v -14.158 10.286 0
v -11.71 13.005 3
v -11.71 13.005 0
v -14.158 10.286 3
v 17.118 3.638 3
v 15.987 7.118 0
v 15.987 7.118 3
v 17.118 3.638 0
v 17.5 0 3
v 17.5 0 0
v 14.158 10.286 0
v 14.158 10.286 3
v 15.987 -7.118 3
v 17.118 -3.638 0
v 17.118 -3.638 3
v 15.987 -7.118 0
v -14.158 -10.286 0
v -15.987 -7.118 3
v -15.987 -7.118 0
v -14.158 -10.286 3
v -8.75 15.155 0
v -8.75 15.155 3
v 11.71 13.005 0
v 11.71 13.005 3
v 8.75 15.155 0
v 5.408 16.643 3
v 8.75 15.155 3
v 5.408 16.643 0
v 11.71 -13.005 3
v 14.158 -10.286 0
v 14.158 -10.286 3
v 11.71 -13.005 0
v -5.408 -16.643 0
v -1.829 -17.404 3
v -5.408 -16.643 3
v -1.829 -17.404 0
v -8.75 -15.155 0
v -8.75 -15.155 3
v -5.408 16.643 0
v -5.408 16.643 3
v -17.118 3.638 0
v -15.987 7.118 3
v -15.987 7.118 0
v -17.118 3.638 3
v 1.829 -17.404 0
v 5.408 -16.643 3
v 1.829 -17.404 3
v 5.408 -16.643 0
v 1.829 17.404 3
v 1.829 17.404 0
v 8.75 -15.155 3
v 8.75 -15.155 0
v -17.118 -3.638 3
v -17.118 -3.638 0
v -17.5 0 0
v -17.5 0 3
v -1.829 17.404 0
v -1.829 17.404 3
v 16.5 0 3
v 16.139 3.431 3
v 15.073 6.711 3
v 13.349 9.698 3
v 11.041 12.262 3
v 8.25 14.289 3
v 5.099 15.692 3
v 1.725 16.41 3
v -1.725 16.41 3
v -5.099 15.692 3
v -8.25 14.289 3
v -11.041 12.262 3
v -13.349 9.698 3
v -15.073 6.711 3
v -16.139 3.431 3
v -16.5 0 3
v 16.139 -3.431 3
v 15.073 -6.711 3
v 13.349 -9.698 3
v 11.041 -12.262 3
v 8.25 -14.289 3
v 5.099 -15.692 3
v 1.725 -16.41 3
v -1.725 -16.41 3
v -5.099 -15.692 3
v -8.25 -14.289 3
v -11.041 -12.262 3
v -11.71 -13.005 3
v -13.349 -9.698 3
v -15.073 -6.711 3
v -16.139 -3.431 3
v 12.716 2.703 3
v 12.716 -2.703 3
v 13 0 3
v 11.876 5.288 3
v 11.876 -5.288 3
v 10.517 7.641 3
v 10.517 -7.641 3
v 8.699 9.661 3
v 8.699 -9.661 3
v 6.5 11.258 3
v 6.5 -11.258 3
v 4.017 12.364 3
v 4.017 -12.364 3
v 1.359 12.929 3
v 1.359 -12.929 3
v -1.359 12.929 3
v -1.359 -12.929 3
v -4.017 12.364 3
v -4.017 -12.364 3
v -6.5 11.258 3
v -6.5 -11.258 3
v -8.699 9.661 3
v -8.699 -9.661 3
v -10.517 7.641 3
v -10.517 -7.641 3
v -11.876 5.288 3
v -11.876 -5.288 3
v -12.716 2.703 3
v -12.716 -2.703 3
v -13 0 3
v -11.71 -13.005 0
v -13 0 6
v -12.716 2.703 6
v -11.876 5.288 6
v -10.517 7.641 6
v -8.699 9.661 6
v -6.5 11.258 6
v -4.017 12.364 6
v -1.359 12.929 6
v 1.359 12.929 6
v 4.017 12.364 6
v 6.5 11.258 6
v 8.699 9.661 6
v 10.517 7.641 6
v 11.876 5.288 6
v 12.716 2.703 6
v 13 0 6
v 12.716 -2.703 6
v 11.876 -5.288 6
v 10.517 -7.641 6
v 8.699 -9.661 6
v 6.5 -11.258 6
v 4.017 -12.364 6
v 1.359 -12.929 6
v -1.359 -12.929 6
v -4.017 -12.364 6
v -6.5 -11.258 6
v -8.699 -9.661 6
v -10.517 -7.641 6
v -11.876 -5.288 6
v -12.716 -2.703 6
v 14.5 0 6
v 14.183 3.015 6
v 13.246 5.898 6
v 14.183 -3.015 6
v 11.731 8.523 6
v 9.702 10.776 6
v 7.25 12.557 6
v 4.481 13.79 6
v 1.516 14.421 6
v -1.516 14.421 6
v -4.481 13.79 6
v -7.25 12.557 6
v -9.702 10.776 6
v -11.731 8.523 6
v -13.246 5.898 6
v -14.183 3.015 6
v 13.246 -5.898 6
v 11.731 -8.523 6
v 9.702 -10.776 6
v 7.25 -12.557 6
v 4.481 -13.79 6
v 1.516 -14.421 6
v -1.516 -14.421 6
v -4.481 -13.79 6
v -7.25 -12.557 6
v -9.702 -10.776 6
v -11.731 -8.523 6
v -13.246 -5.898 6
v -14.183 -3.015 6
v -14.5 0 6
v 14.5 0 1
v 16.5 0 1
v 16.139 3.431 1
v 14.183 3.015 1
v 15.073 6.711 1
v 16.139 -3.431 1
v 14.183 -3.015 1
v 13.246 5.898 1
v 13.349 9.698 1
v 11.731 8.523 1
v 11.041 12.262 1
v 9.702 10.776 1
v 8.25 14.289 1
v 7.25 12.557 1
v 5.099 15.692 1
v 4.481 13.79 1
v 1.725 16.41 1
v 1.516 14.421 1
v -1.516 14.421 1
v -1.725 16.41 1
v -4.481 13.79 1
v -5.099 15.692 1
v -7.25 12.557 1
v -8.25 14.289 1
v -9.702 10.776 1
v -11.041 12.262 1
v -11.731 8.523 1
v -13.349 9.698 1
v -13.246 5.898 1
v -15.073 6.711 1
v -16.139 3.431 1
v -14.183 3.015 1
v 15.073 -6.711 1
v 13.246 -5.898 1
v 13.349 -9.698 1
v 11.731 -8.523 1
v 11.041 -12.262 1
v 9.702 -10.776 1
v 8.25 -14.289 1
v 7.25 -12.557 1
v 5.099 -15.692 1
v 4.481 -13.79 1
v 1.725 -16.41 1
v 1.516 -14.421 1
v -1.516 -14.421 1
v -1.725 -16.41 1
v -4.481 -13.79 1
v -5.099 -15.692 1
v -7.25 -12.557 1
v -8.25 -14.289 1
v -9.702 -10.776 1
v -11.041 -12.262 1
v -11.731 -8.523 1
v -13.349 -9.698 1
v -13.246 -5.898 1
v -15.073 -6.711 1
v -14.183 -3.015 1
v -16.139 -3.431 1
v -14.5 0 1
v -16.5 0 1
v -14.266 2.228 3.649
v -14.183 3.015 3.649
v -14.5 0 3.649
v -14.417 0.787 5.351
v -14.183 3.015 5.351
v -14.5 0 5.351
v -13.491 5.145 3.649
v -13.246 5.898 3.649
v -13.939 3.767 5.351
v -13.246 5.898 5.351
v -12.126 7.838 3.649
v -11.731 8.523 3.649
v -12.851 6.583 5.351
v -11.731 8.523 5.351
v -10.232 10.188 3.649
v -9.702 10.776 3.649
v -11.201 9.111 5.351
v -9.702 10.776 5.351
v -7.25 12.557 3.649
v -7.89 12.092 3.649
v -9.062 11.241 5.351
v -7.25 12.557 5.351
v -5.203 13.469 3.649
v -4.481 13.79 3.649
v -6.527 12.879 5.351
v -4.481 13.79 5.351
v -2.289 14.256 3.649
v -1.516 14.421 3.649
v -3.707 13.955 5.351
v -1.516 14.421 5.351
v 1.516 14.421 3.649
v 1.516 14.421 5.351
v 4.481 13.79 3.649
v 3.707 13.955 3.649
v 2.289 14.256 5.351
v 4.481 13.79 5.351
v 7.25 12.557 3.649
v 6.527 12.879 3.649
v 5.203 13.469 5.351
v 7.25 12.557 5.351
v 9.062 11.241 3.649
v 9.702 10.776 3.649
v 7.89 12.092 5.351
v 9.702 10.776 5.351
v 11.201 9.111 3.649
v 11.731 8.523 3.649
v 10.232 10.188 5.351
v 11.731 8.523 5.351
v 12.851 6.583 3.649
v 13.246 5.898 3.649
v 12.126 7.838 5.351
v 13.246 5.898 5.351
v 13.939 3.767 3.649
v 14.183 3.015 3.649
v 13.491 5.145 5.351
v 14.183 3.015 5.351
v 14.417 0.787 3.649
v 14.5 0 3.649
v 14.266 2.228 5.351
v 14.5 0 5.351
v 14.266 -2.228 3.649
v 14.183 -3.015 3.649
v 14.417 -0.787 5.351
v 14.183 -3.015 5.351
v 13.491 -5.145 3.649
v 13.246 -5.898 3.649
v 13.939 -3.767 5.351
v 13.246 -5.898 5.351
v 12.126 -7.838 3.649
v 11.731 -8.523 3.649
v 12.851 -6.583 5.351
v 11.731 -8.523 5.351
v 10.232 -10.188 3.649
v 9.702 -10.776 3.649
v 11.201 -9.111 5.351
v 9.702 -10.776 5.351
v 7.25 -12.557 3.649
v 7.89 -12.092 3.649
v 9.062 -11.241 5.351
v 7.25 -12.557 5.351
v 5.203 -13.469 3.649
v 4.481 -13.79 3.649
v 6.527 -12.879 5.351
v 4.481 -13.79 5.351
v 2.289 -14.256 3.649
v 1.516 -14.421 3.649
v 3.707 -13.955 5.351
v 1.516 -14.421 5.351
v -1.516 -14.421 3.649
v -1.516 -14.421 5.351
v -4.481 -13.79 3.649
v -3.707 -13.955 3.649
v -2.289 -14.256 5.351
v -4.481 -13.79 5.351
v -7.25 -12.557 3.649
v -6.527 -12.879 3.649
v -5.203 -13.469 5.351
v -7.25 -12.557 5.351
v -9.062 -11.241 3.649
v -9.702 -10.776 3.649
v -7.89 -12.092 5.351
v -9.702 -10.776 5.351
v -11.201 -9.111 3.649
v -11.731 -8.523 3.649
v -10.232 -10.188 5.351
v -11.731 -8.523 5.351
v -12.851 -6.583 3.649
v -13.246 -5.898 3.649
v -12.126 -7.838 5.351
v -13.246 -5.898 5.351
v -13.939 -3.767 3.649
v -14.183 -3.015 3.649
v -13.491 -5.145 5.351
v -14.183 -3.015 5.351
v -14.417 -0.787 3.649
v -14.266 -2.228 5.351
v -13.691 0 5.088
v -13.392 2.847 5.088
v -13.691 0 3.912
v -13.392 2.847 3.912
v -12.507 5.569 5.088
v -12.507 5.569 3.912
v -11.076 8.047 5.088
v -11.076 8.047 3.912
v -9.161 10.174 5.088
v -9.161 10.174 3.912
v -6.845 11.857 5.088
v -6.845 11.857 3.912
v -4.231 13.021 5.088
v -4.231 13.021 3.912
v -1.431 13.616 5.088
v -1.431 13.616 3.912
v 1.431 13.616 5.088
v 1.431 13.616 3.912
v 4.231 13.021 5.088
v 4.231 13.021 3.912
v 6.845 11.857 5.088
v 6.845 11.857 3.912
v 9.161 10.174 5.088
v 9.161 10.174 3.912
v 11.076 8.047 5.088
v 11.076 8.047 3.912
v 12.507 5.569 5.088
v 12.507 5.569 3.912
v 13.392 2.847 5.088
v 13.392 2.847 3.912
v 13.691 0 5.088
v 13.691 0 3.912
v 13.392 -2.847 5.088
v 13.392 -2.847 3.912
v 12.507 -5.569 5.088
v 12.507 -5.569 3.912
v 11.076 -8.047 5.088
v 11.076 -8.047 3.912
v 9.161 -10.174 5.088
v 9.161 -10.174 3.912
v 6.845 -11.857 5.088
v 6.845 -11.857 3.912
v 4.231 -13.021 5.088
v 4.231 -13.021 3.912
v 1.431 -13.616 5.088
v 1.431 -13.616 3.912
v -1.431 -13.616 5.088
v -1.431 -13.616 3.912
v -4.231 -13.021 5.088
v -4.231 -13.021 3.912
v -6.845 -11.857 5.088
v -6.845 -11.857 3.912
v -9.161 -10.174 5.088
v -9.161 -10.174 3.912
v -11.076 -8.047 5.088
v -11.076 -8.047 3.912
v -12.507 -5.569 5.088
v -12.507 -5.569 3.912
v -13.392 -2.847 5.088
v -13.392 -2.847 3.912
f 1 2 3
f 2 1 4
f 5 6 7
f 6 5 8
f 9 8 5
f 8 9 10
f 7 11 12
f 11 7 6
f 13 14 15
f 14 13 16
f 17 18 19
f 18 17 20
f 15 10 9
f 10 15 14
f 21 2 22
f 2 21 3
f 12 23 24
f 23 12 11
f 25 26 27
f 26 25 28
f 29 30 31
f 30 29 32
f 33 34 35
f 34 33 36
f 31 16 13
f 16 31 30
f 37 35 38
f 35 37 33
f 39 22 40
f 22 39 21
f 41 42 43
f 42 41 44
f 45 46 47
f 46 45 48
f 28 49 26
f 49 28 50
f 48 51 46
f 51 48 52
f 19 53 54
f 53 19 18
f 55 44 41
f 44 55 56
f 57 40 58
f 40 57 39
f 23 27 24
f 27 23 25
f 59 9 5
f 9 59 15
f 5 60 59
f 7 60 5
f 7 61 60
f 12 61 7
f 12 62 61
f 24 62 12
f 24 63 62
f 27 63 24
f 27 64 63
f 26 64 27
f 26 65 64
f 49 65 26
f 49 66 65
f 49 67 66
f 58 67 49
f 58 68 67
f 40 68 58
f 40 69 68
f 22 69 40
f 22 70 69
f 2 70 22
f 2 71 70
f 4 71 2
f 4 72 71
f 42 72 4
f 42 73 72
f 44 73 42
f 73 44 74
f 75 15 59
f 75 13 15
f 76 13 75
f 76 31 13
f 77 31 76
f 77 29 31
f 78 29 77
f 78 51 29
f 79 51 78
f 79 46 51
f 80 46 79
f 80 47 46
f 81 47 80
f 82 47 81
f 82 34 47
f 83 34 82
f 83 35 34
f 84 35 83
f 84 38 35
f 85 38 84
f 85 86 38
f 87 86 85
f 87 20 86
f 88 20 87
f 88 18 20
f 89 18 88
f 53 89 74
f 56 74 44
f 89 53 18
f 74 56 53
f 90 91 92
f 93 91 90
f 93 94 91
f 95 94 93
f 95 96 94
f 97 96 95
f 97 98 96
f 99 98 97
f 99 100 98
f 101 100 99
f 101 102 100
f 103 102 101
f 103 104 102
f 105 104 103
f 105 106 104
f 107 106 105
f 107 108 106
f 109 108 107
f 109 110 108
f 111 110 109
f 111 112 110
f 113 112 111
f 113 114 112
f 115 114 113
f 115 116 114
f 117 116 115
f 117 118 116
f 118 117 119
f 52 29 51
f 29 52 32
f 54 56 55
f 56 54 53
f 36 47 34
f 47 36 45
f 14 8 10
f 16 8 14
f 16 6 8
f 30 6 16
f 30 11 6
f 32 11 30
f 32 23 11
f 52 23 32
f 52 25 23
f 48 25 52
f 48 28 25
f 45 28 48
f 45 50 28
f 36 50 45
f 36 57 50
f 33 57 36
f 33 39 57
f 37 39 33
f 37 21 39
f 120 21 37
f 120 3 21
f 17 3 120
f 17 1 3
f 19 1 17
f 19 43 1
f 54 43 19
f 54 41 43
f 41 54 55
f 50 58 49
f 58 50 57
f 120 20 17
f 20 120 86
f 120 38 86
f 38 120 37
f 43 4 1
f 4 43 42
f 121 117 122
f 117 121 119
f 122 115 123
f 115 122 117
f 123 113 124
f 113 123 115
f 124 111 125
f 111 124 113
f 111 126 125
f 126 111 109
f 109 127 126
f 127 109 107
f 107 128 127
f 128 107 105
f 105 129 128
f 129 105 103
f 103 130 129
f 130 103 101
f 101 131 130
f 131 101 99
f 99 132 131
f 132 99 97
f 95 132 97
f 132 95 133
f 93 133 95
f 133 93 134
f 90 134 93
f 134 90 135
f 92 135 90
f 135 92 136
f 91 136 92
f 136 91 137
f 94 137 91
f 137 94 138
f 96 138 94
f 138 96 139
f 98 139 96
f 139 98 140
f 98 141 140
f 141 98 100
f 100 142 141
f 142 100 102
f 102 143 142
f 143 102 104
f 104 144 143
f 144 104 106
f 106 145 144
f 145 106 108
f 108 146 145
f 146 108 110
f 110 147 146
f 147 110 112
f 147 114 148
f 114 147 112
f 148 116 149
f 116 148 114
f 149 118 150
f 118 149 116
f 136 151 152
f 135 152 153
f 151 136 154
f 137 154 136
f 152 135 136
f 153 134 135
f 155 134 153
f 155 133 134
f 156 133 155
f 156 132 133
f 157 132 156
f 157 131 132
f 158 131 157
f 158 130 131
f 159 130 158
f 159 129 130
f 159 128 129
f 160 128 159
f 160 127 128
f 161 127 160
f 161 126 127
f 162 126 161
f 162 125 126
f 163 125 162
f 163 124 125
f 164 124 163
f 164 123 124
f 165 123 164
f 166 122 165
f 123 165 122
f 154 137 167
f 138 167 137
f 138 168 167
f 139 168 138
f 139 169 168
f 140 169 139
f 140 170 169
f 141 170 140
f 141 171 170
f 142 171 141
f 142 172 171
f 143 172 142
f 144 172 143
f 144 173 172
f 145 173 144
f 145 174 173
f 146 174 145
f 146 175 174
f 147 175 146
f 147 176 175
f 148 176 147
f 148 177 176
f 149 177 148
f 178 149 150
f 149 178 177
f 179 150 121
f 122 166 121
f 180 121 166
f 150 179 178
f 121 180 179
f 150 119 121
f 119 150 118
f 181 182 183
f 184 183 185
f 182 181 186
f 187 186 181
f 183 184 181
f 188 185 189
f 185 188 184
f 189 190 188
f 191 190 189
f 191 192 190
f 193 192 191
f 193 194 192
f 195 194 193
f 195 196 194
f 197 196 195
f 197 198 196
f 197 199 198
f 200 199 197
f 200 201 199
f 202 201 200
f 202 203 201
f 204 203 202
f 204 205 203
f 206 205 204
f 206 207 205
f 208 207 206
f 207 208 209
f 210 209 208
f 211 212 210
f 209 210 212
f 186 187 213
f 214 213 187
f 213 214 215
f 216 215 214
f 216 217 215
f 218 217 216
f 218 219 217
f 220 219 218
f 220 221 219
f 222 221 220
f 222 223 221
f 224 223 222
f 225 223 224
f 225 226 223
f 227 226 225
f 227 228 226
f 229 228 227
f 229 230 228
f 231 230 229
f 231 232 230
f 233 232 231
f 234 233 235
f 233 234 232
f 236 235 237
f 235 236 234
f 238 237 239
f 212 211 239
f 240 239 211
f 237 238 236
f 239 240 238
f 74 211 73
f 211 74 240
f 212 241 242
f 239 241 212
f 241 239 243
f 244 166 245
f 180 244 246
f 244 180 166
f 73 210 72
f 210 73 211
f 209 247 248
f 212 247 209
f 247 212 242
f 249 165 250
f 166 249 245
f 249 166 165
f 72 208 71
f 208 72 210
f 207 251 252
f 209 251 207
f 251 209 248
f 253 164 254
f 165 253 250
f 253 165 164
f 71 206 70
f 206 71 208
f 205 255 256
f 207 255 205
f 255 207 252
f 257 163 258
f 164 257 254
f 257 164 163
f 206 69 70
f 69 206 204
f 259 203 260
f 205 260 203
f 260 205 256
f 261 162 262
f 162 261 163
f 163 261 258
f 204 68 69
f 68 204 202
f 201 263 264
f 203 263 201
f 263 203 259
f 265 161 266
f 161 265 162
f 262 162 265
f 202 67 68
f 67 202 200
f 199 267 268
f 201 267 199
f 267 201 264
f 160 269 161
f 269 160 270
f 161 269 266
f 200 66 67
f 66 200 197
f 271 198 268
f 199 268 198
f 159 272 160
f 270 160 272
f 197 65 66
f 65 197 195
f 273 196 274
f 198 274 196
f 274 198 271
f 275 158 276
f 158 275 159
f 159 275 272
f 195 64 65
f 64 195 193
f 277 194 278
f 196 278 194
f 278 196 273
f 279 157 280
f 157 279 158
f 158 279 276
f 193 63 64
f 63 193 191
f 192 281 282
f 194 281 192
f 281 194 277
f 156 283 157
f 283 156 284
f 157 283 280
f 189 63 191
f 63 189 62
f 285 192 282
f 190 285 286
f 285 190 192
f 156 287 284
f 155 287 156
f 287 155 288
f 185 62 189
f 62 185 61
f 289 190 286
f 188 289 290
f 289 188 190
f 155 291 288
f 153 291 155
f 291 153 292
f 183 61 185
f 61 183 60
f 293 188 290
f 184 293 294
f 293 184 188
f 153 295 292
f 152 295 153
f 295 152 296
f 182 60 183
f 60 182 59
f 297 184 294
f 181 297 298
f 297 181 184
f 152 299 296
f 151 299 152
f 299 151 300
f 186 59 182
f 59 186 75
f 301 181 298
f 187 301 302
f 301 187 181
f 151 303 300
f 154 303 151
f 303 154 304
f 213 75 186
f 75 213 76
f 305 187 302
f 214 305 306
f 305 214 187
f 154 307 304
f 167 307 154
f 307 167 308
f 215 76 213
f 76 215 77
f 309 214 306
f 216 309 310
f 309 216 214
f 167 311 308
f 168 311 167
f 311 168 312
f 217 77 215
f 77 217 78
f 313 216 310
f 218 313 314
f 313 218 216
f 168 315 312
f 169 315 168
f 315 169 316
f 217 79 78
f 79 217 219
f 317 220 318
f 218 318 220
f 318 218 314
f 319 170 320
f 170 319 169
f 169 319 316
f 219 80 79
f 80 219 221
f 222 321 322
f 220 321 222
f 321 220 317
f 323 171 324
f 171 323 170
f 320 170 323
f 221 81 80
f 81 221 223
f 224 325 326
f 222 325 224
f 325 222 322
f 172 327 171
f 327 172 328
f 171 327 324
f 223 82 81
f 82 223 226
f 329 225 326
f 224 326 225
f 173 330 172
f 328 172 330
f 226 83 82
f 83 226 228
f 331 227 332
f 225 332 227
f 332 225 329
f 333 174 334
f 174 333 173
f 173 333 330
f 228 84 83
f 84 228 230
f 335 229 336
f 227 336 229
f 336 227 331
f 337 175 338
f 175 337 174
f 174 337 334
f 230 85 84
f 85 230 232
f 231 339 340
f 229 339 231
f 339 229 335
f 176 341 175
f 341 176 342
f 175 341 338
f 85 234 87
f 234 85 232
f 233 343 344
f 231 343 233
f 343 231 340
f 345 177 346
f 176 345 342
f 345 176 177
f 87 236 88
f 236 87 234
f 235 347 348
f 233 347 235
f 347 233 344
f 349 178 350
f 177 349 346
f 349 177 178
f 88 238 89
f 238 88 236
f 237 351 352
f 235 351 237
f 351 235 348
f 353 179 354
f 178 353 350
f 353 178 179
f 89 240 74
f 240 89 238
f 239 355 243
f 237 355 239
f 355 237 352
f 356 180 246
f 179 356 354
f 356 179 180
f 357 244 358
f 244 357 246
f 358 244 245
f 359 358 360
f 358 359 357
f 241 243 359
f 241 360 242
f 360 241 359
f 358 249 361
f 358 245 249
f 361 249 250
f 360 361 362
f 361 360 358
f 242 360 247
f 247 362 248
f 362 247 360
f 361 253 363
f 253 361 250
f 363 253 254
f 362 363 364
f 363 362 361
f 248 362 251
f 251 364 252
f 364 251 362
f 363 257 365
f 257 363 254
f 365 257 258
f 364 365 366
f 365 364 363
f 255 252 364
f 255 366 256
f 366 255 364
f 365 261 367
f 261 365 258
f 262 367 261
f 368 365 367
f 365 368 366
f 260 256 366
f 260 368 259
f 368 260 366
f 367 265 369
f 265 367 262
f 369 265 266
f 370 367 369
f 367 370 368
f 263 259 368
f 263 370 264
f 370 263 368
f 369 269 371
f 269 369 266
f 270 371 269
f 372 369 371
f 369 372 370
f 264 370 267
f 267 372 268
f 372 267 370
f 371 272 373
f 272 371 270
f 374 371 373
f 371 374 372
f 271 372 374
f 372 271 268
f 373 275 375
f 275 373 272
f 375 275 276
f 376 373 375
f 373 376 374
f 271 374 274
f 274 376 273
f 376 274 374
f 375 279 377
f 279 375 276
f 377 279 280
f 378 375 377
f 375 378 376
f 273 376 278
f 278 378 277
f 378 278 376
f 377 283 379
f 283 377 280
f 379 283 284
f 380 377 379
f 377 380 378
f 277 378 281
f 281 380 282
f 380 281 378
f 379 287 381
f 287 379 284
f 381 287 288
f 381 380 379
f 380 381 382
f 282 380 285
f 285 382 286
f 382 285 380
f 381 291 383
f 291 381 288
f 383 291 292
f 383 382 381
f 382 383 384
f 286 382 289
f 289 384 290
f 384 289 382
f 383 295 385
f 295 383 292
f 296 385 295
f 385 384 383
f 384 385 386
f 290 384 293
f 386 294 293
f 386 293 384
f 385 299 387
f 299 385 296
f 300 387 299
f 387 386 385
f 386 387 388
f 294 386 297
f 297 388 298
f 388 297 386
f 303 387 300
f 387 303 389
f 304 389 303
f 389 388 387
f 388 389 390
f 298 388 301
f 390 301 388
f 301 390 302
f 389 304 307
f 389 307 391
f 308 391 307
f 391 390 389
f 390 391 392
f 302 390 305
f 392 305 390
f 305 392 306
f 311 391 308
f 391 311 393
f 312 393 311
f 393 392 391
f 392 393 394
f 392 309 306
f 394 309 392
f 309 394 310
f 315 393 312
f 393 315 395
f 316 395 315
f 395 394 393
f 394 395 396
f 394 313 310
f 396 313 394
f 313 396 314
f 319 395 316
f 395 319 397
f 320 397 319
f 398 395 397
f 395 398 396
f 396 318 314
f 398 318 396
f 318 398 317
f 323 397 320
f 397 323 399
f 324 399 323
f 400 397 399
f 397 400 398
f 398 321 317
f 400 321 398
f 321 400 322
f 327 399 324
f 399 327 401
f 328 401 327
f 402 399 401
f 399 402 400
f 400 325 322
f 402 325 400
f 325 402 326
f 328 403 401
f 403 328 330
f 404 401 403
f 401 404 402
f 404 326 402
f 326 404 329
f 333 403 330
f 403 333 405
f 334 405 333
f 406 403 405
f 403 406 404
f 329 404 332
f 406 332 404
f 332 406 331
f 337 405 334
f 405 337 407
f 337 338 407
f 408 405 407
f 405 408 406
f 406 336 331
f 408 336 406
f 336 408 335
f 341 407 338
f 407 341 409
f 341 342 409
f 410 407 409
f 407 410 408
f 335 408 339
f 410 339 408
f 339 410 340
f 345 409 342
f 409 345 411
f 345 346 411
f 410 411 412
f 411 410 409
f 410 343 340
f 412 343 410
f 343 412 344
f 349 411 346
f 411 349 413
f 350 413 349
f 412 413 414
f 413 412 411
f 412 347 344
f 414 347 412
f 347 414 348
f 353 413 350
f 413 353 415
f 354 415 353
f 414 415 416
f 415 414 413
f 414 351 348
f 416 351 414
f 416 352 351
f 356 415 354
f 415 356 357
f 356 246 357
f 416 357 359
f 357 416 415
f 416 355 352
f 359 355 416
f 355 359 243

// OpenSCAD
/*License Info: (c) Mike "Boff" Harratt 2018
Some Rights Reserved - Available under Attribution-NonCommercial-ShareAlike 4.0 International License

Basically, you can remix, distribute and edit this for non-commerical purposes (i.e. making your own for yourself but not for sale) Any files you make changes to /must/ be available under the same license.

Parts list:
Power Ram:
> Forward cap
> Power Tube Cap
> Rear piston
>> Piston head
>> Piston core w/bolt hole
>> O-Ring collar
>> Piston body w/sear cut out
> Pusher Arm
> 

*/

//$fn = 128;

/*
Master Bolt Types:
Allows you to pre-select the type of bolt used by default in each of the areas
-> Master Strutucal Bolt is the main construction bolt; defaults to M3
-> Power Tube Bolt is the nuts and bolts used in the power tube; defaults to M2

-> BOLT_TYPE Arguements are as follows: 
--> HEX | CSK | RAISEDCSK | PANHEAD | CHEESEHEAD | CAPSCREW | CSKSOCKETSCREW

-> NUT_TYPE Arguments are as follows:
--> NORMAL | NYLOC

*/

//Master Structural Bolt Configuration
MSB_THREAD = 3;
MSB_TYPE = "CAPSCREW";
MSB_NUT_TYPE = "NYLOC";

//Power Tube Bolt Configuration
PTB_THREAD = 2;
PTB_TYPE = "PANHEAD";
PTB_NUT_TYPE = "NYLOC";

//Global Variables
BT4_LENGTH = 49.25;
BT4_TOP_DIAMETER = 23.21;
BT4_BOTTOM_DIAMETER = 22.5;
BT4_THREAD = (1 / 8) * 25.4;

STROKE_LENGTH = 42; //Total stroke length in mm

//Master Wall Thickness
//Set the master wall thickness for the blaster
SWT = 3; //Standard wall thickness
NWT = 1.5; //Narrow wall thickness

//Power Tube Dimensions
POWER_TUBE_ALU_OD = 10;
POWER_TUBE_ALU_ID = 8;

//Dart Pusher Dimensions
DART_PUSHER_ALU_OD = 12;
DART_PUSHER_ALU_ID = 10;
DART_PUSHER_CHAMFER = 2;

if(DART_PUSHER_ALU_ID != POWER_TUBE_ALU_OD) echo("WARNING! Power tube and dart pusher should nest!");

//Pusher Arm Dimensions
PUSHER_ARM_WIDTH = NWT * 2;
PUSHER_ARM_HEIGHT = NWT;

//Power Ram Tube Configuration
POWER_RAM_OD = 32;
POWER_RAM_WALL = 2;
POWER_RAM_ID = POWER_RAM_OD - POWER_RAM_WALL * 2;
POWER_RAM_O_RING_THICKNESS = 2;
POWER_RAM_NUMBER_OF_O_RINGS = 1; //TO DO: Implement number of O-Rings feature

//Interface (Power Tube Clamp to Forward Power Tube) O Ring Dimensons
INTERFACE_O_RING_THICKNESS = 1.5;
INTERFACE_O_RING_DIAMETER = POWER_TUBE_ALU_OD + INTERFACE_O_RING_THICKNESS / 0.5;

//Power Tube O-Ring Configuration
POWER_TUBE_O_RING_THICKNESS = 2;
POWER_TUBE_O_RING_DIAMETER = 10;
NUMBER_POWER_TUBE_O_RINGS = 2;

//Dart Pusher Collar Configuration
DART_PUSHER_COLLAR_O_RING_THICKNESS = 2;
DART_PUSHER_COLLAR_O_RING_DIAMETER = DART_PUSHER_ALU_OD + DART_PUSHER_COLLAR_O_RING_THICKNESS / 0.5;
NUMBER_DART_PUSHER_O_RINGS = 1;

DART_PUSHER_COLLAR_OD = DART_PUSHER_ALU_OD + SWT * 2;
DART_PUSHER_COLLAR_ID = DART_PUSHER_ALU_OD;
DART_PUSHER_COLLAR_HEIGHT = PTB_THREAD * 2 + SWT ;

// Rear Piston Variables
REAR_PISTON_DIAMETER = BT4_TOP_DIAMETER  - 0.5;
REAR_PISTON_O_RING_THICKNESS = 2;
REAR_PISTON_O_RING_DIAMETER = 15;



module BT4_Geometry()
{
    
    cylinder(d1 = BT4_TOP_DIAMETER, d2 = BT4_BOTTOM_DIAMETER, h = BT4_LENGTH);
    
}


module Forward_Power_Tube()
{
    //Geometry for the forward power tube
    // TO DO: Drill pilot hole for BT4 valve

    O_RING_COLLAR_HEIGHT = INTERFACE_O_RING_THICKNESS + SWT * 2;
    
    POWER_TUBE_CHAMFER_THICKNESS = 3;
    PISTON_HEAD_REST_THICKNESS = 3;
    
    VALVE_COLLAR_Z_LINE = O_RING_COLLAR_HEIGHT + POWER_TUBE_CHAMFER_THICKNESS;
    PISTON_HEAD_REST_Z_LINE = VALVE_COLLAR_Z_LINE + BT4_LENGTH;
    REAR_PISTON_COLLAR_Z_LINE = PISTON_HEAD_REST_Z_LINE + PISTON_HEAD_REST_THICKNESS;
        
    difference()
    {
        union()
        {
            
            //Interface Collar Geometry
            cylinder(d = POWER_TUBE_ALU_OD + SWT, h = O_RING_COLLAR_HEIGHT);
            
            //Chamfer Geometry
            translate([0, 0, O_RING_COLLAR_HEIGHT])
            {
                cylinder(d1 = POWER_TUBE_ALU_OD + SWT, d2 = BT4_TOP_DIAMETER + SWT, h = POWER_TUBE_CHAMFER_THICKNESS);
            }
            
            //Valve Collar Geometry
            translate([0, 0, VALVE_COLLAR_Z_LINE])
            {
                cylinder(d = SWT + BT4_TOP_DIAMETER, h = BT4_LENGTH);
            }
            
            //Piston Head Rest Geometry
            translate([0, 0, PISTON_HEAD_REST_Z_LINE])
            {
                cylinder(d = SWT + BT4_TOP_DIAMETER, h = PISTON_HEAD_REST_THICKNESS);
            }           
            
            //Rear Piston Collar Geometry
            translate([0, 0, REAR_PISTON_COLLAR_Z_LINE])
            {
                cylinder(d = SWT + BT4_TOP_DIAMETER, h = POWER_TUBE_CHAMFER_THICKNESS);
            }
            
            //Bracing geometry                        
            BRACE_OD = POWER_RAM_OD - POWER_RAM_WALL;
            BRACE_ID = SWT + BT4_TOP_DIAMETER;
            
            BRACE_WALL = BRACE_OD - BRACE_ID;
            
            BRACE_OFFSET = 10; //Space between the two bracing walls
            
            BRACE_CENTRE_POINT = PISTON_HEAD_REST_Z_LINE / 2;
            
            translate([0, 0, BRACE_CENTRE_POINT])
            {
                for(i = [-1 : 1 : 1])
                {
                    translate([0, 0, i * BRACE_OFFSET])
                    {
                        cylinder(d1 = BRACE_ID, d2 = BRACE_OD, h = BRACE_WALL);
                    }
                }
            }
                        
        }
        
        //Interface Collar Geometry
        cylinder(d = POWER_TUBE_ALU_OD, h = VALVE_COLLAR_Z_LINE);
        
        //Chamfer Geometry
        translate([0, 0, VALVE_COLLAR_Z_LINE]) 
        {
            cylinder(d = BT4_TOP_DIAMETER, h = BT4_LENGTH);
        }

        //Piston Head Rest Geometry
        translate([0, 0, PISTON_HEAD_REST_Z_LINE])
        {
            cylinder(d = BT4_TOP_DIAMETER, h = PISTON_HEAD_REST_THICKNESS);
        }   

        //Rear Piston Collar Geometry
        translate([0, 0, REAR_PISTON_COLLAR_Z_LINE]) 
        {
            cylinder(d1 = BT4_TOP_DIAMETER, d2 = BT4_TOP_DIAMETER + NWT, h = POWER_TUBE_CHAMFER_THICKNESS);
        }

        //O-Ring Grooves
        translate([0, 0, O_RING_COLLAR_HEIGHT / 2])
        {
            torus(INTERFACE_O_RING_DIAMETER, INTERFACE_O_RING_THICKNESS);
        }        
    }    
}

module Power_Tube_Clamp(TRAPS)
{
    //Basic geometry for the power tube clamp - this is the basic element that will allow you to then add
    //nut traps and bolt holes to the completed piece to be locked in place
    //To Do: Conisder adding flared interface collar to interface with the Forward Power Tube module
    O_RING_COLLAR_HEIGHT = INTERFACE_O_RING_THICKNESS + SWT * 2;
    POWER_TUBE_O_RING_COLUMN_HEIGHT = (SWT * 2 + POWER_TUBE_O_RING_THICKNESS) * NUMBER_POWER_TUBE_O_RINGS;
            
    POWER_TUBE_CLAMP_HEIGHT = O_RING_COLLAR_HEIGHT + POWER_TUBE_O_RING_COLUMN_HEIGHT;
    POWER_TUBE_CLAMP_DIAMETER = POWER_TUBE_ALU_OD + (SWT * 2);
    
    echo(POWER_TUBE_CLAMP_HEIGHT);
    
    difference()
    {
        //Main Clamp Body
        cylinder(d = POWER_TUBE_CLAMP_DIAMETER, h = POWER_TUBE_CLAMP_HEIGHT);
        
        //Forward Power Tube Interface Gemoetry
        //To do: Add O Ring interface groove
        cylinder(d = POWER_TUBE_ALU_OD + SWT, O_RING_COLLAR_HEIGHT);
        
        //Alu Power Tube Interface
        //To do: Securing O Ring grooves
        cylinder(d = POWER_TUBE_ALU_OD, h = POWER_TUBE_CLAMP_HEIGHT);
        
        //O-Ring Grooves
        translate([0, 0, O_RING_COLLAR_HEIGHT / 2])
        {
            torus(INTERFACE_O_RING_DIAMETER, INTERFACE_O_RING_THICKNESS);
        }  
               
        translate([0, 0, O_RING_COLLAR_HEIGHT + SWT])
        {
            for(i = [1 : 1 : NUMBER_POWER_TUBE_O_RINGS])
            {
                translate([0, 0, i * (POWER_TUBE_O_RING_THICKNESS + SWT)])
                {
                    torus(POWER_TUBE_O_RING_DIAMETER, POWER_TUBE_O_RING_THICKNESS);
                }
            }       
        }
        
        //Bolt Holes
        for(i = [0 : 1])
        {
            mirror([i, 0, 0])
            {
                translate([(POWER_TUBE_CLAMP_DIAMETER / 2) - NWT, POWER_TUBE_CLAMP_DIAMETER / 2, POWER_TUBE_CLAMP_HEIGHT / 2])
                {
                    rotate([90, 90, 0])
                    {
                        cylinder(d = PTB_THREAD, h = POWER_TUBE_CLAMP_DIAMETER);
                    }
                    
                    if(TRAPS == 0)
                    {
                        //Code for bolt caps
                        translate([0, -DART_PUSHER_COLLAR_OD + SWT * 1.5, 0])
                        {
                            rotate([90, 0, 0])
                            {
                               cylinder(d = PTB_THREAD * 2, h = DART_PUSHER_COLLAR_OD);
                            }
                        }
                    }
                    
                    if(TRAPS == 1)
                    {
                        //Code for nut traps
                        translate([0, -DART_PUSHER_COLLAR_OD - SWT, 0])
                        {
                            rotate([90, 90, 0])
                            {
                                hexagon(PTB_THREAD * 2, DART_PUSHER_COLLAR_OD);
                            }
                        }
                    }
                    
                }
                
               
            }
        }
        
        //Halving cube
        translate([-POWER_TUBE_CLAMP_DIAMETER / 2, 0, 0])
        {
            cube([POWER_TUBE_CLAMP_DIAMETER, POWER_TUBE_CLAMP_DIAMETER, POWER_TUBE_CLAMP_HEIGHT]);
        }
        
    }
    
}

module Power_Tube_Clamp_Tray()
{
    //Provides a pair of pusher collars complete with appropriate nut and cap traps
    
    TRAY_SPACE = 20; //Distance between objects on the printer tray
    
    difference()
    {
        union()
        {
            for(i = [0 : 1])
            {
                translate([i * TRAY_SPACE, 0, 0])
                {
                    mirror([i, 0, 0])
                    {
                        Power_Tube_Clamp(i);
                    }
                }
            }
        }
    }
}

module Power_Ram_Front_Cap()
{
    difference()
    {
        union()
        {
            POWER_RAM_FRONT_CAP_OD = POWER_RAM_OD + SWT;
            cylinder(d = POWER_RAM_FRONT_CAP_OD, h = SWT);
            
            //
            translate([0, 0, SWT])
            {
                square_torus(POWER_RAM_ID, POWER_RAM_WALL, SWT);
            }
        }
        
        cylinder(d = DART_PUSHER_ALU_OD, h =  SWT);
        
        //Power Ram Pipe Groove
        translate([0, 0, SWT - POWER_RAM_WALL])
        {
            square_torus(POWER_RAM_ID + SWT, POWER_RAM_WALL, POWER_RAM_WALL * 4);
        }
        
        translate([0, 0, SWT + (SWT / 2)])
        {
            torus(POWER_RAM_ID + 1, POWER_RAM_O_RING_THICKNESS);
        }
        
    }
    
}

module Power_Ram_Rear_Cap()
{
    difference()
    {
        union()
        {
            POWER_RAM_FRONT_CAP_OD = POWER_RAM_OD + SWT;
            cylinder(d = POWER_RAM_FRONT_CAP_OD, h = SWT);
            
            translate([0, 0, SWT])
            {
                square_torus(POWER_RAM_ID, POWER_RAM_WALL, SWT);
            }            
        }
        
        //Power Ram Pipe Groove
        translate([0, 0, SWT - POWER_RAM_WALL])
        {
            square_torus(POWER_RAM_ID + SWT, POWER_RAM_WALL, POWER_RAM_WALL * 4);
        }
        
        translate([0, 0, SWT + (SWT / 2)])
        {
            torus(POWER_RAM_ID + 1, POWER_RAM_O_RING_THICKNESS);
        }
        
    }
}


module Dart_Pusher()
{
    //Secured to Dart Pusher Collar 
    
    DART_PUSHER_LENGTH = STROKE_LENGTH + DART_PUSHER_COLLAR_HEIGHT;
    
    difference()
    {
        union()
        {
            cylinder(d = DART_PUSHER_ALU_OD, h = DART_PUSHER_LENGTH - DART_PUSHER_CHAMFER);
            
            translate([0, 0, DART_PUSHER_LENGTH - DART_PUSHER_CHAMFER])
            {
                cylinder(d1 = DART_PUSHER_ALU_OD, d2 = DART_PUSHER_ALU_ID, h = DART_PUSHER_CHAMFER);
            }
        }
        
        cylinder(d = DART_PUSHER_ALU_ID , h = DART_PUSHER_LENGTH);
        
        //Collar O Ring Groove
        translate([0, 0, DART_PUSHER_COLLAR_HEIGHT / 2])
        {
            torus(DART_PUSHER_ALU_OD, POWER_TUBE_O_RING_THICKNESS);
        }
        
    }
    
}

module Dart_Pusher_Collar(TRAPS)
{
    //Basic geometry for the dart pusher collar, secured to the dart pusher using O ring and narrow bolts
       
    difference()
    {
        echo(DART_PUSHER_COLLAR_OD); 
        cylinder(d = DART_PUSHER_COLLAR_OD, h = DART_PUSHER_COLLAR_HEIGHT);
        
        //Aluminium hole geometry
        cylinder(d = DART_PUSHER_ALU_ID, h = DART_PUSHER_COLLAR_HEIGHT);
        
        //Securing Bolt Holes
        for(i = [0 : 1 : 1])
        {
            mirror([i, 0, 0])
            {                  
                translate([DART_PUSHER_COLLAR_OD / 2 - NWT, (DART_PUSHER_COLLAR_OD / 2), DART_PUSHER_COLLAR_HEIGHT / 2])
                {
                    
                    if(TRAPS == 0)
                    {
                        //Code for bolt caps
                        translate([0, -DART_PUSHER_COLLAR_OD + SWT * 1.5, 0])
                        {
                            rotate([90, 0, 0])
                            {
                               cylinder(d = PTB_THREAD * 2, h = DART_PUSHER_COLLAR_OD);
                            }
                        }
                    }
                    
                    if(TRAPS == 1)
                    {
                        //Code for nut traps
                        translate([0, -DART_PUSHER_COLLAR_OD - SWT * 1.5, 0])
                        {
                            rotate([90, 90, 0])
                            {
                                hexagon(PTB_THREAD * 2, DART_PUSHER_COLLAR_OD);
                            }
                        }
                    }
                    
                    rotate([90, 90, 0])
                    {
                        cylinder(d = PTB_THREAD, h = DART_PUSHER_COLLAR_OD);
                    }
                }
            }
        }
        
        //Pusher Arm Cut Out
        translate([DART_PUSHER_COLLAR_OD - DART_PUSHER_COLLAR_ID, -PUSHER_ARM_WIDTH / 2, 0])
        {
            cube([DART_PUSHER_COLLAR_OD, PUSHER_ARM_WIDTH, DART_PUSHER_COLLAR_HEIGHT]);
        }
            
        //O Ring Groove
        translate([0, 0, DART_PUSHER_COLLAR_HEIGHT / 2])
        {
            torus(POWER_TUBE_O_RING_DIAMETER, POWER_TUBE_O_RING_THICKNESS);
        }
        
        //Halving Cube
        translate([-DART_PUSHER_COLLAR_OD / 2, 0, 0])
        {
            cube([DART_PUSHER_COLLAR_OD, DART_PUSHER_COLLAR_OD, DART_PUSHER_COLLAR_HEIGHT]);
        }        
    }
    
}


module Dart_Pusher_Collar_Tray()
{
    //Provides a pair of pusher collars complete with appropriate nut and cap traps
    
    TRAY_SPACE = 5; //Distance between objects on the printer tray
    
    difference()
    {
        union()
        {
            for(i = [0 : 1])
            {
                translate([0, i * TRAY_SPACE, 0])
                {
                    mirror([0, i, 0])
                    {
                        Dart_Pusher_Collar(i);
                    }
                }
            }
        }
    }
}

module torus(d, t)
{
    rotate_extrude(angle = 360, convexity = 10)
    {
        translate([d / 2, 0, 0])
        {
            circle(r = t/2);
        }
    }
}

module square_torus(d, t1, t2)
{
    if(t2 == 0) {t2 = t1;};
    
    rotate_extrude(angle = 360, convexity = 10)
    {
        translate([d / 2 - t1 / 2, 0, 0])
        {
            square([t1, t2]);
        }
    }
}

// size is the XY plane size, height in Z
module hexagon(size, height) {
  boxWidth = size/1.75;
  for (r = [-60, 0, 60]) rotate([0,0,r]) cube([boxWidth, size, height], true);
}


module Bolt_Geometry(THREAD_SIZE, THREAD_LENGTH, HEAD_TYPE, FLUSH)
{
    
    // HEAD_TYPE: HEX | CSK | RAISEDCSK | PANHEAD | CHEESEHEAD | CAPSCREW | CSKSOCKETSCREW | NUTTRAP | NYLOCTRAP
    // Fastening Geometry from here: http://www.metrication.com/engineering/fastener.html
    
    union()  
    {
        if(HEAD_TYPE == "HEX")
        {
            THREAD_Z = THREAD_SIZE * 0.7;
            
            translate([0, 0, THREAD_Z / 2])
            {
                hexagon(THREAD_SIZE * 2, THREAD_Z);
            }
            
            Bolt_Thread(THREAD_Z, THREAD_SIZE, THREAD_LENGTH);
        }
        
        if(HEAD_TYPE == "CSK")
        {            
            THREAD_Z = THREAD_SIZE / 2;
            
            cylinder(d1 = THREAD_SIZE * 2, d2 = THREAD_SIZE, h = THREAD_Z);
            Bolt_Thread(THREAD_Z, THREAD_SIZE, THREAD_LENGTH); 
        }
        
        if(HEAD_TYPE == "RAISEDCSK")
        {
            
            THREAD_Z = THREAD_SIZE / 2;
            
            cylinder(d = THREAD_SIZE * 2, h = THREAD_SIZE /4);
            
            translate([0, 0, THREAD_SIZE / 4])
            {
                cylinder(d1 = THREAD_SIZE * 2, d2 = THREAD_SIZE, h = THREAD_Z);
            }
            
            Bolt_Thread(THREAD_Z + THREAD_SIZE / 4, THREAD_SIZE, THREAD_LENGTH); 
            
        }
        
        if(HEAD_TYPE == "PANHEAD")
        {
            THREAD_Z = 0.6 * THREAD_SIZE;

            cylinder(d = 2 * THREAD_SIZE, h = THREAD_Z);
            Bolt_Thread(THREAD_Z, THREAD_SIZE, THREAD_LENGTH);  
        }
        
        if(HEAD_TYPE == "CHEESEHEAD")
        {
            THREAD_Z = 0.6 * THREAD_SIZE;

            cylinder(d = 1.6 * THREAD_SIZE, h = THREAD_Z);
            Bolt_Thread(THREAD_Z, THREAD_SIZE, THREAD_LENGTH);  
        }
        
        if(HEAD_TYPE == "CAPSCREW")
        {
            THREAD_Z = 1.25 * THREAD_SIZE;

            cylinder(d = 1.5 * THREAD_SIZE, h = THREAD_Z);
            Bolt_Thread(THREAD_Z, THREAD_SIZE, THREAD_LENGTH);           
                 
        }
        
        if(HEAD_TYPE == "CSKSOCKETSCREW")
        {
        }
        
        if(HEAD_TYPE == "NUTTRAP")
        {
            //Produces a nut trap for a structural hexagonal nut, not a nylon locking nut
            THREAD_Z = THREAD_SIZE * 0.9;
            translate([0, 0, THREAD_Z / 2])
            {
                hexagon(THREAD_SIZE * 2, THREAD_Z);
            }
        } 
 
        if(HEAD_TYPE == "NYLOCTRAP")
        {
           if(THREAD_SIZE == 1.6) {THREAD_Z = 1.65;};
           if(THREAD_SIZE == 2) {THREAD_Z = 2.8;};
           if(THREAD_SIZE == 2.5) {THREAD_Z = 3.8;};
           if(THREAD_SIZE == 3) {THREAD_Z = 4;};
           if(THREAD_SIZE == 4) {THREAD_Z = 5;};
           if(THREAD_SIZE == 5) {THREAD_Z = 6.3;};
           if(THREAD_SIZE == 6) {THREAD_Z = 8;};
           if(THREAD_SIZE == 8) {THREAD_Z = 9.5;};
            
            //Produces a nut trap for a structural hexagonal nut, not a nylon locking nut
            THREAD_Z = THREAD_SIZE * 0.9;
            translate([0, 0, THREAD_Z / 2])
            {
                hexagon(THREAD_SIZE * 2, THREAD_Z);
            }       
        }
        
    }

}

module Bolt_Thread(Z, THREAD_SIZE, THREAD_LENGTH)
{
    //Module exists because of scoping problems for OpenSCAD, lifts the bolt thread by a specified amount
    
    translate([0, 0, Z])
    {
        cylinder(d = THREAD_SIZE, h = THREAD_LENGTH);
    }
}


module Rear_Piston_Head()
{
    difference()
    {
        //cylinder(d = REAR_PISTON_DIAMETER, h = 12);
        Bolt_Geometry(3, 25, "NUTTRAP", "TRUE");
    }
}

//Rear_Piston_Head();
//Forward_Power_Tube();
//Power_Tube_Clamp_Tray();
//Dart_Pusher_Collar_Tray();
//Power_Ram_Front_Cap();
Power_Ram_Rear_Cap();
